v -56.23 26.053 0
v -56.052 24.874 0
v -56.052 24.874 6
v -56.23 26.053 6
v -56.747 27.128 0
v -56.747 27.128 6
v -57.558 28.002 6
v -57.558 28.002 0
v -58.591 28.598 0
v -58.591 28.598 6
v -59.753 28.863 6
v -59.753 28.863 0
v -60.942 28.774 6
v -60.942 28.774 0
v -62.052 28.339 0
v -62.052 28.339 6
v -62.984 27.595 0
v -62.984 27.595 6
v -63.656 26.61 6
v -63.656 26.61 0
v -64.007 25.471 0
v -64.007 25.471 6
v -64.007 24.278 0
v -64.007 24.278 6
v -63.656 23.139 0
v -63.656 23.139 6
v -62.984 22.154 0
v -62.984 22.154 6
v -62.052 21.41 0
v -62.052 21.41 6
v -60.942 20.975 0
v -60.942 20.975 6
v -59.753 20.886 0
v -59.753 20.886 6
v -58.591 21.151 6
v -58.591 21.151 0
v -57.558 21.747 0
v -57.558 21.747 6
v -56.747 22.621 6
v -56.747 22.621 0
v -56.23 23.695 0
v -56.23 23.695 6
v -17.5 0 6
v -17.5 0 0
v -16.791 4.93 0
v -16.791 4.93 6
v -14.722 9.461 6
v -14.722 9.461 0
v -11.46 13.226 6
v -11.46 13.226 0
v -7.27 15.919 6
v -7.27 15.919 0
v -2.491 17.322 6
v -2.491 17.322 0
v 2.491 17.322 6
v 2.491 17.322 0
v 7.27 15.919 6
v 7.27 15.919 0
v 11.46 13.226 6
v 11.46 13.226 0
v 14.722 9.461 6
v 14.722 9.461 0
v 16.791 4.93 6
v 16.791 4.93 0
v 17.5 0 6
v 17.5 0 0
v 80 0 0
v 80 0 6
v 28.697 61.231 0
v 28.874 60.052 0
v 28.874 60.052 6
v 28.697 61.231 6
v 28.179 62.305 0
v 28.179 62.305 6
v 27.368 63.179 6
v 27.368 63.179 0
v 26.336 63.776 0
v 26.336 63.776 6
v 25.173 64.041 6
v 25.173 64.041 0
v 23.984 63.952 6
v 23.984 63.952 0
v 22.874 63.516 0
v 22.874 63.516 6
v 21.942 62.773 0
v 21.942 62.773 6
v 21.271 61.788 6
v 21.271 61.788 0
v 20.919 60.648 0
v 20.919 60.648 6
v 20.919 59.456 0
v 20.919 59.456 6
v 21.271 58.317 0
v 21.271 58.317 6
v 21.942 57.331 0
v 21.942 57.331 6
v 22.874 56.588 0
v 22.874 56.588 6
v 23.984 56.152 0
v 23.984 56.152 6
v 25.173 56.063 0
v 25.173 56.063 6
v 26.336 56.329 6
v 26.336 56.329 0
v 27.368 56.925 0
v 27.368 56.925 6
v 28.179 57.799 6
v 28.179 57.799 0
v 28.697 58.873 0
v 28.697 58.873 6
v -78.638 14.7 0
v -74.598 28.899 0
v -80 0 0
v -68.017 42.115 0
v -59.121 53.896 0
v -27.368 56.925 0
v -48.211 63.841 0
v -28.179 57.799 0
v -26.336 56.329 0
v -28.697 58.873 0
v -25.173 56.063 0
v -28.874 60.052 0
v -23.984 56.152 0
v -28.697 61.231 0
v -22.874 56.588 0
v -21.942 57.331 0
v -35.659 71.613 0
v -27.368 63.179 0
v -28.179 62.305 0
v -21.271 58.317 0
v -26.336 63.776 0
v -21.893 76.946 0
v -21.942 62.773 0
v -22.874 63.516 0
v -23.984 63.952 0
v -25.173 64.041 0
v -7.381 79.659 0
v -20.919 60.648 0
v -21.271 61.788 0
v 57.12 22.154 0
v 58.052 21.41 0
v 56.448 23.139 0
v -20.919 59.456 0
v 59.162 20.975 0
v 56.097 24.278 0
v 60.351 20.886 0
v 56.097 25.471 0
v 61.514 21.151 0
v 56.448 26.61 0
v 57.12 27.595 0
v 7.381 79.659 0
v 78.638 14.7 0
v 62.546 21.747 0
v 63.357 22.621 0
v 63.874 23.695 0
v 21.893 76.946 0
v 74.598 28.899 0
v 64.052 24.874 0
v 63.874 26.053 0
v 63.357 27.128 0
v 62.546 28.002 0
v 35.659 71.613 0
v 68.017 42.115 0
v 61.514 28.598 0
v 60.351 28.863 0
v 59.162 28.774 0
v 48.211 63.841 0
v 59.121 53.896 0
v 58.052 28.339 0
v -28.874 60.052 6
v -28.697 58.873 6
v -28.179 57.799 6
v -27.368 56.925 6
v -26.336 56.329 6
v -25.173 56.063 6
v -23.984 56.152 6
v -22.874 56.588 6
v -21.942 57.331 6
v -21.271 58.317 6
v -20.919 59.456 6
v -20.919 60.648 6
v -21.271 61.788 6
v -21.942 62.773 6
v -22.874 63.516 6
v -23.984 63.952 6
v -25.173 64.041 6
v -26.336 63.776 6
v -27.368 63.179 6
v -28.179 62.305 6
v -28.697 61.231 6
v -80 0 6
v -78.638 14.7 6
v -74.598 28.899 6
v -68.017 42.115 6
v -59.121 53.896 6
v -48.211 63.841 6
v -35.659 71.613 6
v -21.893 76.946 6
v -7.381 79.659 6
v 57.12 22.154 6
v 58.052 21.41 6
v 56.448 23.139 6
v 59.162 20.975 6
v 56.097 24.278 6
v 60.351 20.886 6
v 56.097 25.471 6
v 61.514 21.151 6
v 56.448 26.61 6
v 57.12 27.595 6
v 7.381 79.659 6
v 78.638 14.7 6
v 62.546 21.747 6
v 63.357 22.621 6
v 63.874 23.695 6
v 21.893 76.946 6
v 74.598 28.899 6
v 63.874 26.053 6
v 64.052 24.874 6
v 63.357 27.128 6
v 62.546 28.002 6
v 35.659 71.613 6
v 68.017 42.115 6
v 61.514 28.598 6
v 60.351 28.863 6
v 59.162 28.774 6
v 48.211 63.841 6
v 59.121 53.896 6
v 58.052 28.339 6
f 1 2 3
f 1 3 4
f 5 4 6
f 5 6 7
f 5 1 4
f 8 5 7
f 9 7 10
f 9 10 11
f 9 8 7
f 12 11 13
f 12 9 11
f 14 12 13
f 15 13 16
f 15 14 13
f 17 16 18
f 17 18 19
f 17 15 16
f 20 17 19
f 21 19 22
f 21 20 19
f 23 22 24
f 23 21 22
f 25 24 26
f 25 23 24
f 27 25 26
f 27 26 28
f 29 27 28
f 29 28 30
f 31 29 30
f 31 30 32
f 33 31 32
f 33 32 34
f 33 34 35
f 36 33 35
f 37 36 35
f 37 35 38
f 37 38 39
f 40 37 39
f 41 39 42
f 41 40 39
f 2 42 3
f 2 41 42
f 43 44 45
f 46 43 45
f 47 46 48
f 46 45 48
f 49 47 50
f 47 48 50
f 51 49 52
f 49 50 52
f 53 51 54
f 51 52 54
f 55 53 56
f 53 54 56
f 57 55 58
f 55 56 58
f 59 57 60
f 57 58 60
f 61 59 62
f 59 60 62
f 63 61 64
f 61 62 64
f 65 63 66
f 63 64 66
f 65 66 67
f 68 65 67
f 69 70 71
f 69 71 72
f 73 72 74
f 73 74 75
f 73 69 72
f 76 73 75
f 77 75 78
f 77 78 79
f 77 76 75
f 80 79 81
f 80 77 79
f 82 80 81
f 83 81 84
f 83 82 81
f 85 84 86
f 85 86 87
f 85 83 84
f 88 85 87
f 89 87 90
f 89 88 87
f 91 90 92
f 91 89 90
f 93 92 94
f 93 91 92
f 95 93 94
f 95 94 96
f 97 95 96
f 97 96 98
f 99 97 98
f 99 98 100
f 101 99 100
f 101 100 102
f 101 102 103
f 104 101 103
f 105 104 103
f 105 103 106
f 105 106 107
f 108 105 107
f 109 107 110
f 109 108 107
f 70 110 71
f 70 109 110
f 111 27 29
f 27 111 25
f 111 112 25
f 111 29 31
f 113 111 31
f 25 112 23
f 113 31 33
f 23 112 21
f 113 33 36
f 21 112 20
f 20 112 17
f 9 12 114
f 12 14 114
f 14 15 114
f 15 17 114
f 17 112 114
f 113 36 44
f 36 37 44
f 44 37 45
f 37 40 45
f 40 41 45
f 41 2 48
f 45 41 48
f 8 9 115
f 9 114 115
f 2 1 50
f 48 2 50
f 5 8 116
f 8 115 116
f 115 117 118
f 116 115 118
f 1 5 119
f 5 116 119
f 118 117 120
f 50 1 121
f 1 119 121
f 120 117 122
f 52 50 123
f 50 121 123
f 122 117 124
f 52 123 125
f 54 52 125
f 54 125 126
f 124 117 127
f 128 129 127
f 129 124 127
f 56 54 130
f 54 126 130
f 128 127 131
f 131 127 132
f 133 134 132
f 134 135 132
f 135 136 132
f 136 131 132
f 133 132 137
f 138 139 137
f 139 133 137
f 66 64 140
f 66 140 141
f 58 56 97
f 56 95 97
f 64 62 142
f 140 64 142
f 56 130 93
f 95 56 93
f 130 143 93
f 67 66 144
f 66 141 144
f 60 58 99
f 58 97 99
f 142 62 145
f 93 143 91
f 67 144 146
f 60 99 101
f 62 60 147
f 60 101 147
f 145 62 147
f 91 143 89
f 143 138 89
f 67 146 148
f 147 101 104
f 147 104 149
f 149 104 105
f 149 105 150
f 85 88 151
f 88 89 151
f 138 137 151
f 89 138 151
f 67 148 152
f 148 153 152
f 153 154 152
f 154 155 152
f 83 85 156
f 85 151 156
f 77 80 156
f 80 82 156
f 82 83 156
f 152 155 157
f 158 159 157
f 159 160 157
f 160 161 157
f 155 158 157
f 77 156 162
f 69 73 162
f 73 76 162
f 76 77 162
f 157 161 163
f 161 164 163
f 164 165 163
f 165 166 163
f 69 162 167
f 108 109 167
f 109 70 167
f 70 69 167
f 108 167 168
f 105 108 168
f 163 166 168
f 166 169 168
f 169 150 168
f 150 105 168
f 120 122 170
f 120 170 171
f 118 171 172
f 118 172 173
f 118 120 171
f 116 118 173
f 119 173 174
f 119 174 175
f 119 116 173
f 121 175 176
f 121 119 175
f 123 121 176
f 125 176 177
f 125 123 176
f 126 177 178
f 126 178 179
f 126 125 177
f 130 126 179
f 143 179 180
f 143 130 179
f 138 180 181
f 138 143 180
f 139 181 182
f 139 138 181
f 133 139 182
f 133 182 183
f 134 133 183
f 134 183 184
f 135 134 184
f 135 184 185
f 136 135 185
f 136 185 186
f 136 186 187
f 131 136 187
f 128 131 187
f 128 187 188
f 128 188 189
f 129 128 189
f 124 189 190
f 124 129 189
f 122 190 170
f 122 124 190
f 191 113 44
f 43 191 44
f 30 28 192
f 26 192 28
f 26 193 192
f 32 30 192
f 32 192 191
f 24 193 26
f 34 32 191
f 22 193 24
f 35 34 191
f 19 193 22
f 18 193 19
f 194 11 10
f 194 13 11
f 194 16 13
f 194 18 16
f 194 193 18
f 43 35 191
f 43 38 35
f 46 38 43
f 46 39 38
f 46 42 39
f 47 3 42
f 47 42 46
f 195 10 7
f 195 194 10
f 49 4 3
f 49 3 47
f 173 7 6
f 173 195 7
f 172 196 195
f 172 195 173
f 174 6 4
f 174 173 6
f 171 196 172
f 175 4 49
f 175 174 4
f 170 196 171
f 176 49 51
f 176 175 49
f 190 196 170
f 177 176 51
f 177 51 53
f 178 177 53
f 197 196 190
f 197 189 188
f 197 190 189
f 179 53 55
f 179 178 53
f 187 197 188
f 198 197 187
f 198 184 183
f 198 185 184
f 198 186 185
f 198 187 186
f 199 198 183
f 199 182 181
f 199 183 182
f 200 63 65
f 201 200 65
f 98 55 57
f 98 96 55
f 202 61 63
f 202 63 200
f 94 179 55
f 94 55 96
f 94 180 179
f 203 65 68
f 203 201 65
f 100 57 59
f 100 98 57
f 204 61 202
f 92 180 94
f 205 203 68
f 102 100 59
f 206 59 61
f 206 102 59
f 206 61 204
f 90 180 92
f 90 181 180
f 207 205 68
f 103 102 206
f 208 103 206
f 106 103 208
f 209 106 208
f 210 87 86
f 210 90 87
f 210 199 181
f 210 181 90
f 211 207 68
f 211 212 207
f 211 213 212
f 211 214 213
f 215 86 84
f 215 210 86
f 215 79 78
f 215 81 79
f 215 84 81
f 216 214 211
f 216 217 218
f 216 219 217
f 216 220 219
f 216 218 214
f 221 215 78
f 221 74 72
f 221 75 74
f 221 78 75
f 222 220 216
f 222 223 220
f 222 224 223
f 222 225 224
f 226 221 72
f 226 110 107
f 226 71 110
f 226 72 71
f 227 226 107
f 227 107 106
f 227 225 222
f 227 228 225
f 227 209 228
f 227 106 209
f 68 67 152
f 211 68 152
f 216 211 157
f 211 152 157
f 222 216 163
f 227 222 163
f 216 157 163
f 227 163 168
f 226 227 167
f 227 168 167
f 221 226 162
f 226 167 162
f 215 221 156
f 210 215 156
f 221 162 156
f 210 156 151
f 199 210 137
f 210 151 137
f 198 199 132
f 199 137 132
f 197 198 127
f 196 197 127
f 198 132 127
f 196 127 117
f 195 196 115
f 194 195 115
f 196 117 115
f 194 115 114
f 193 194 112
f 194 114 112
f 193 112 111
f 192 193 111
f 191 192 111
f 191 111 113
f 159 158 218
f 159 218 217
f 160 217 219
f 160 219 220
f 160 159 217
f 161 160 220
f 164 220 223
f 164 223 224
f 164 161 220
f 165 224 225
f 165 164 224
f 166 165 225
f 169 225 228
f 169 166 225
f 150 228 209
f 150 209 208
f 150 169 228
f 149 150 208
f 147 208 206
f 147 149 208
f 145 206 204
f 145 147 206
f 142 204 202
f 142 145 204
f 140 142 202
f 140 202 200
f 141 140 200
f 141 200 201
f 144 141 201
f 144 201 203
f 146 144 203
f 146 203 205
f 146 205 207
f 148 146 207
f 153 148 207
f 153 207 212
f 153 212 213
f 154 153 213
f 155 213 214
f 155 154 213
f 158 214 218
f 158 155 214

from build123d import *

# Parameters (mm, degrees)
SKETCH1_R           = 4
BOSS_EXTRUDE1_DEPTH = 6


with BuildPart() as part:
    # Sketch1 → Boss-Extrude1 (new body)
    with BuildSketch(Plane.XY):
        with BuildLine():
            Line((-80, 0), (-17.5, 0))
            ThreePointArc((-17.5, 0), (0, 17.5), (17.5, 0))
            Line((17.5, 0), (80, 0))
            ThreePointArc((80, 0), (0, 80), (-80, 0))
        make_face()
        with Locations((24.874423104, 60.052169613)):
            Circle(SKETCH1_R, mode=Mode.SUBTRACT)
        with Locations((60.052169613, 24.874423104)):
            Circle(SKETCH1_R, mode=Mode.SUBTRACT)
        with Locations((-60.052169613, 24.874423104)):
            Circle(SKETCH1_R, mode=Mode.SUBTRACT)
        with Locations(Location((-24.874423104, 60.052169613, 0), (0, 0, 180))):
            Circle(SKETCH1_R, mode=Mode.SUBTRACT)
    extrude(amount=BOSS_EXTRUDE1_DEPTH)


solid = part.part
